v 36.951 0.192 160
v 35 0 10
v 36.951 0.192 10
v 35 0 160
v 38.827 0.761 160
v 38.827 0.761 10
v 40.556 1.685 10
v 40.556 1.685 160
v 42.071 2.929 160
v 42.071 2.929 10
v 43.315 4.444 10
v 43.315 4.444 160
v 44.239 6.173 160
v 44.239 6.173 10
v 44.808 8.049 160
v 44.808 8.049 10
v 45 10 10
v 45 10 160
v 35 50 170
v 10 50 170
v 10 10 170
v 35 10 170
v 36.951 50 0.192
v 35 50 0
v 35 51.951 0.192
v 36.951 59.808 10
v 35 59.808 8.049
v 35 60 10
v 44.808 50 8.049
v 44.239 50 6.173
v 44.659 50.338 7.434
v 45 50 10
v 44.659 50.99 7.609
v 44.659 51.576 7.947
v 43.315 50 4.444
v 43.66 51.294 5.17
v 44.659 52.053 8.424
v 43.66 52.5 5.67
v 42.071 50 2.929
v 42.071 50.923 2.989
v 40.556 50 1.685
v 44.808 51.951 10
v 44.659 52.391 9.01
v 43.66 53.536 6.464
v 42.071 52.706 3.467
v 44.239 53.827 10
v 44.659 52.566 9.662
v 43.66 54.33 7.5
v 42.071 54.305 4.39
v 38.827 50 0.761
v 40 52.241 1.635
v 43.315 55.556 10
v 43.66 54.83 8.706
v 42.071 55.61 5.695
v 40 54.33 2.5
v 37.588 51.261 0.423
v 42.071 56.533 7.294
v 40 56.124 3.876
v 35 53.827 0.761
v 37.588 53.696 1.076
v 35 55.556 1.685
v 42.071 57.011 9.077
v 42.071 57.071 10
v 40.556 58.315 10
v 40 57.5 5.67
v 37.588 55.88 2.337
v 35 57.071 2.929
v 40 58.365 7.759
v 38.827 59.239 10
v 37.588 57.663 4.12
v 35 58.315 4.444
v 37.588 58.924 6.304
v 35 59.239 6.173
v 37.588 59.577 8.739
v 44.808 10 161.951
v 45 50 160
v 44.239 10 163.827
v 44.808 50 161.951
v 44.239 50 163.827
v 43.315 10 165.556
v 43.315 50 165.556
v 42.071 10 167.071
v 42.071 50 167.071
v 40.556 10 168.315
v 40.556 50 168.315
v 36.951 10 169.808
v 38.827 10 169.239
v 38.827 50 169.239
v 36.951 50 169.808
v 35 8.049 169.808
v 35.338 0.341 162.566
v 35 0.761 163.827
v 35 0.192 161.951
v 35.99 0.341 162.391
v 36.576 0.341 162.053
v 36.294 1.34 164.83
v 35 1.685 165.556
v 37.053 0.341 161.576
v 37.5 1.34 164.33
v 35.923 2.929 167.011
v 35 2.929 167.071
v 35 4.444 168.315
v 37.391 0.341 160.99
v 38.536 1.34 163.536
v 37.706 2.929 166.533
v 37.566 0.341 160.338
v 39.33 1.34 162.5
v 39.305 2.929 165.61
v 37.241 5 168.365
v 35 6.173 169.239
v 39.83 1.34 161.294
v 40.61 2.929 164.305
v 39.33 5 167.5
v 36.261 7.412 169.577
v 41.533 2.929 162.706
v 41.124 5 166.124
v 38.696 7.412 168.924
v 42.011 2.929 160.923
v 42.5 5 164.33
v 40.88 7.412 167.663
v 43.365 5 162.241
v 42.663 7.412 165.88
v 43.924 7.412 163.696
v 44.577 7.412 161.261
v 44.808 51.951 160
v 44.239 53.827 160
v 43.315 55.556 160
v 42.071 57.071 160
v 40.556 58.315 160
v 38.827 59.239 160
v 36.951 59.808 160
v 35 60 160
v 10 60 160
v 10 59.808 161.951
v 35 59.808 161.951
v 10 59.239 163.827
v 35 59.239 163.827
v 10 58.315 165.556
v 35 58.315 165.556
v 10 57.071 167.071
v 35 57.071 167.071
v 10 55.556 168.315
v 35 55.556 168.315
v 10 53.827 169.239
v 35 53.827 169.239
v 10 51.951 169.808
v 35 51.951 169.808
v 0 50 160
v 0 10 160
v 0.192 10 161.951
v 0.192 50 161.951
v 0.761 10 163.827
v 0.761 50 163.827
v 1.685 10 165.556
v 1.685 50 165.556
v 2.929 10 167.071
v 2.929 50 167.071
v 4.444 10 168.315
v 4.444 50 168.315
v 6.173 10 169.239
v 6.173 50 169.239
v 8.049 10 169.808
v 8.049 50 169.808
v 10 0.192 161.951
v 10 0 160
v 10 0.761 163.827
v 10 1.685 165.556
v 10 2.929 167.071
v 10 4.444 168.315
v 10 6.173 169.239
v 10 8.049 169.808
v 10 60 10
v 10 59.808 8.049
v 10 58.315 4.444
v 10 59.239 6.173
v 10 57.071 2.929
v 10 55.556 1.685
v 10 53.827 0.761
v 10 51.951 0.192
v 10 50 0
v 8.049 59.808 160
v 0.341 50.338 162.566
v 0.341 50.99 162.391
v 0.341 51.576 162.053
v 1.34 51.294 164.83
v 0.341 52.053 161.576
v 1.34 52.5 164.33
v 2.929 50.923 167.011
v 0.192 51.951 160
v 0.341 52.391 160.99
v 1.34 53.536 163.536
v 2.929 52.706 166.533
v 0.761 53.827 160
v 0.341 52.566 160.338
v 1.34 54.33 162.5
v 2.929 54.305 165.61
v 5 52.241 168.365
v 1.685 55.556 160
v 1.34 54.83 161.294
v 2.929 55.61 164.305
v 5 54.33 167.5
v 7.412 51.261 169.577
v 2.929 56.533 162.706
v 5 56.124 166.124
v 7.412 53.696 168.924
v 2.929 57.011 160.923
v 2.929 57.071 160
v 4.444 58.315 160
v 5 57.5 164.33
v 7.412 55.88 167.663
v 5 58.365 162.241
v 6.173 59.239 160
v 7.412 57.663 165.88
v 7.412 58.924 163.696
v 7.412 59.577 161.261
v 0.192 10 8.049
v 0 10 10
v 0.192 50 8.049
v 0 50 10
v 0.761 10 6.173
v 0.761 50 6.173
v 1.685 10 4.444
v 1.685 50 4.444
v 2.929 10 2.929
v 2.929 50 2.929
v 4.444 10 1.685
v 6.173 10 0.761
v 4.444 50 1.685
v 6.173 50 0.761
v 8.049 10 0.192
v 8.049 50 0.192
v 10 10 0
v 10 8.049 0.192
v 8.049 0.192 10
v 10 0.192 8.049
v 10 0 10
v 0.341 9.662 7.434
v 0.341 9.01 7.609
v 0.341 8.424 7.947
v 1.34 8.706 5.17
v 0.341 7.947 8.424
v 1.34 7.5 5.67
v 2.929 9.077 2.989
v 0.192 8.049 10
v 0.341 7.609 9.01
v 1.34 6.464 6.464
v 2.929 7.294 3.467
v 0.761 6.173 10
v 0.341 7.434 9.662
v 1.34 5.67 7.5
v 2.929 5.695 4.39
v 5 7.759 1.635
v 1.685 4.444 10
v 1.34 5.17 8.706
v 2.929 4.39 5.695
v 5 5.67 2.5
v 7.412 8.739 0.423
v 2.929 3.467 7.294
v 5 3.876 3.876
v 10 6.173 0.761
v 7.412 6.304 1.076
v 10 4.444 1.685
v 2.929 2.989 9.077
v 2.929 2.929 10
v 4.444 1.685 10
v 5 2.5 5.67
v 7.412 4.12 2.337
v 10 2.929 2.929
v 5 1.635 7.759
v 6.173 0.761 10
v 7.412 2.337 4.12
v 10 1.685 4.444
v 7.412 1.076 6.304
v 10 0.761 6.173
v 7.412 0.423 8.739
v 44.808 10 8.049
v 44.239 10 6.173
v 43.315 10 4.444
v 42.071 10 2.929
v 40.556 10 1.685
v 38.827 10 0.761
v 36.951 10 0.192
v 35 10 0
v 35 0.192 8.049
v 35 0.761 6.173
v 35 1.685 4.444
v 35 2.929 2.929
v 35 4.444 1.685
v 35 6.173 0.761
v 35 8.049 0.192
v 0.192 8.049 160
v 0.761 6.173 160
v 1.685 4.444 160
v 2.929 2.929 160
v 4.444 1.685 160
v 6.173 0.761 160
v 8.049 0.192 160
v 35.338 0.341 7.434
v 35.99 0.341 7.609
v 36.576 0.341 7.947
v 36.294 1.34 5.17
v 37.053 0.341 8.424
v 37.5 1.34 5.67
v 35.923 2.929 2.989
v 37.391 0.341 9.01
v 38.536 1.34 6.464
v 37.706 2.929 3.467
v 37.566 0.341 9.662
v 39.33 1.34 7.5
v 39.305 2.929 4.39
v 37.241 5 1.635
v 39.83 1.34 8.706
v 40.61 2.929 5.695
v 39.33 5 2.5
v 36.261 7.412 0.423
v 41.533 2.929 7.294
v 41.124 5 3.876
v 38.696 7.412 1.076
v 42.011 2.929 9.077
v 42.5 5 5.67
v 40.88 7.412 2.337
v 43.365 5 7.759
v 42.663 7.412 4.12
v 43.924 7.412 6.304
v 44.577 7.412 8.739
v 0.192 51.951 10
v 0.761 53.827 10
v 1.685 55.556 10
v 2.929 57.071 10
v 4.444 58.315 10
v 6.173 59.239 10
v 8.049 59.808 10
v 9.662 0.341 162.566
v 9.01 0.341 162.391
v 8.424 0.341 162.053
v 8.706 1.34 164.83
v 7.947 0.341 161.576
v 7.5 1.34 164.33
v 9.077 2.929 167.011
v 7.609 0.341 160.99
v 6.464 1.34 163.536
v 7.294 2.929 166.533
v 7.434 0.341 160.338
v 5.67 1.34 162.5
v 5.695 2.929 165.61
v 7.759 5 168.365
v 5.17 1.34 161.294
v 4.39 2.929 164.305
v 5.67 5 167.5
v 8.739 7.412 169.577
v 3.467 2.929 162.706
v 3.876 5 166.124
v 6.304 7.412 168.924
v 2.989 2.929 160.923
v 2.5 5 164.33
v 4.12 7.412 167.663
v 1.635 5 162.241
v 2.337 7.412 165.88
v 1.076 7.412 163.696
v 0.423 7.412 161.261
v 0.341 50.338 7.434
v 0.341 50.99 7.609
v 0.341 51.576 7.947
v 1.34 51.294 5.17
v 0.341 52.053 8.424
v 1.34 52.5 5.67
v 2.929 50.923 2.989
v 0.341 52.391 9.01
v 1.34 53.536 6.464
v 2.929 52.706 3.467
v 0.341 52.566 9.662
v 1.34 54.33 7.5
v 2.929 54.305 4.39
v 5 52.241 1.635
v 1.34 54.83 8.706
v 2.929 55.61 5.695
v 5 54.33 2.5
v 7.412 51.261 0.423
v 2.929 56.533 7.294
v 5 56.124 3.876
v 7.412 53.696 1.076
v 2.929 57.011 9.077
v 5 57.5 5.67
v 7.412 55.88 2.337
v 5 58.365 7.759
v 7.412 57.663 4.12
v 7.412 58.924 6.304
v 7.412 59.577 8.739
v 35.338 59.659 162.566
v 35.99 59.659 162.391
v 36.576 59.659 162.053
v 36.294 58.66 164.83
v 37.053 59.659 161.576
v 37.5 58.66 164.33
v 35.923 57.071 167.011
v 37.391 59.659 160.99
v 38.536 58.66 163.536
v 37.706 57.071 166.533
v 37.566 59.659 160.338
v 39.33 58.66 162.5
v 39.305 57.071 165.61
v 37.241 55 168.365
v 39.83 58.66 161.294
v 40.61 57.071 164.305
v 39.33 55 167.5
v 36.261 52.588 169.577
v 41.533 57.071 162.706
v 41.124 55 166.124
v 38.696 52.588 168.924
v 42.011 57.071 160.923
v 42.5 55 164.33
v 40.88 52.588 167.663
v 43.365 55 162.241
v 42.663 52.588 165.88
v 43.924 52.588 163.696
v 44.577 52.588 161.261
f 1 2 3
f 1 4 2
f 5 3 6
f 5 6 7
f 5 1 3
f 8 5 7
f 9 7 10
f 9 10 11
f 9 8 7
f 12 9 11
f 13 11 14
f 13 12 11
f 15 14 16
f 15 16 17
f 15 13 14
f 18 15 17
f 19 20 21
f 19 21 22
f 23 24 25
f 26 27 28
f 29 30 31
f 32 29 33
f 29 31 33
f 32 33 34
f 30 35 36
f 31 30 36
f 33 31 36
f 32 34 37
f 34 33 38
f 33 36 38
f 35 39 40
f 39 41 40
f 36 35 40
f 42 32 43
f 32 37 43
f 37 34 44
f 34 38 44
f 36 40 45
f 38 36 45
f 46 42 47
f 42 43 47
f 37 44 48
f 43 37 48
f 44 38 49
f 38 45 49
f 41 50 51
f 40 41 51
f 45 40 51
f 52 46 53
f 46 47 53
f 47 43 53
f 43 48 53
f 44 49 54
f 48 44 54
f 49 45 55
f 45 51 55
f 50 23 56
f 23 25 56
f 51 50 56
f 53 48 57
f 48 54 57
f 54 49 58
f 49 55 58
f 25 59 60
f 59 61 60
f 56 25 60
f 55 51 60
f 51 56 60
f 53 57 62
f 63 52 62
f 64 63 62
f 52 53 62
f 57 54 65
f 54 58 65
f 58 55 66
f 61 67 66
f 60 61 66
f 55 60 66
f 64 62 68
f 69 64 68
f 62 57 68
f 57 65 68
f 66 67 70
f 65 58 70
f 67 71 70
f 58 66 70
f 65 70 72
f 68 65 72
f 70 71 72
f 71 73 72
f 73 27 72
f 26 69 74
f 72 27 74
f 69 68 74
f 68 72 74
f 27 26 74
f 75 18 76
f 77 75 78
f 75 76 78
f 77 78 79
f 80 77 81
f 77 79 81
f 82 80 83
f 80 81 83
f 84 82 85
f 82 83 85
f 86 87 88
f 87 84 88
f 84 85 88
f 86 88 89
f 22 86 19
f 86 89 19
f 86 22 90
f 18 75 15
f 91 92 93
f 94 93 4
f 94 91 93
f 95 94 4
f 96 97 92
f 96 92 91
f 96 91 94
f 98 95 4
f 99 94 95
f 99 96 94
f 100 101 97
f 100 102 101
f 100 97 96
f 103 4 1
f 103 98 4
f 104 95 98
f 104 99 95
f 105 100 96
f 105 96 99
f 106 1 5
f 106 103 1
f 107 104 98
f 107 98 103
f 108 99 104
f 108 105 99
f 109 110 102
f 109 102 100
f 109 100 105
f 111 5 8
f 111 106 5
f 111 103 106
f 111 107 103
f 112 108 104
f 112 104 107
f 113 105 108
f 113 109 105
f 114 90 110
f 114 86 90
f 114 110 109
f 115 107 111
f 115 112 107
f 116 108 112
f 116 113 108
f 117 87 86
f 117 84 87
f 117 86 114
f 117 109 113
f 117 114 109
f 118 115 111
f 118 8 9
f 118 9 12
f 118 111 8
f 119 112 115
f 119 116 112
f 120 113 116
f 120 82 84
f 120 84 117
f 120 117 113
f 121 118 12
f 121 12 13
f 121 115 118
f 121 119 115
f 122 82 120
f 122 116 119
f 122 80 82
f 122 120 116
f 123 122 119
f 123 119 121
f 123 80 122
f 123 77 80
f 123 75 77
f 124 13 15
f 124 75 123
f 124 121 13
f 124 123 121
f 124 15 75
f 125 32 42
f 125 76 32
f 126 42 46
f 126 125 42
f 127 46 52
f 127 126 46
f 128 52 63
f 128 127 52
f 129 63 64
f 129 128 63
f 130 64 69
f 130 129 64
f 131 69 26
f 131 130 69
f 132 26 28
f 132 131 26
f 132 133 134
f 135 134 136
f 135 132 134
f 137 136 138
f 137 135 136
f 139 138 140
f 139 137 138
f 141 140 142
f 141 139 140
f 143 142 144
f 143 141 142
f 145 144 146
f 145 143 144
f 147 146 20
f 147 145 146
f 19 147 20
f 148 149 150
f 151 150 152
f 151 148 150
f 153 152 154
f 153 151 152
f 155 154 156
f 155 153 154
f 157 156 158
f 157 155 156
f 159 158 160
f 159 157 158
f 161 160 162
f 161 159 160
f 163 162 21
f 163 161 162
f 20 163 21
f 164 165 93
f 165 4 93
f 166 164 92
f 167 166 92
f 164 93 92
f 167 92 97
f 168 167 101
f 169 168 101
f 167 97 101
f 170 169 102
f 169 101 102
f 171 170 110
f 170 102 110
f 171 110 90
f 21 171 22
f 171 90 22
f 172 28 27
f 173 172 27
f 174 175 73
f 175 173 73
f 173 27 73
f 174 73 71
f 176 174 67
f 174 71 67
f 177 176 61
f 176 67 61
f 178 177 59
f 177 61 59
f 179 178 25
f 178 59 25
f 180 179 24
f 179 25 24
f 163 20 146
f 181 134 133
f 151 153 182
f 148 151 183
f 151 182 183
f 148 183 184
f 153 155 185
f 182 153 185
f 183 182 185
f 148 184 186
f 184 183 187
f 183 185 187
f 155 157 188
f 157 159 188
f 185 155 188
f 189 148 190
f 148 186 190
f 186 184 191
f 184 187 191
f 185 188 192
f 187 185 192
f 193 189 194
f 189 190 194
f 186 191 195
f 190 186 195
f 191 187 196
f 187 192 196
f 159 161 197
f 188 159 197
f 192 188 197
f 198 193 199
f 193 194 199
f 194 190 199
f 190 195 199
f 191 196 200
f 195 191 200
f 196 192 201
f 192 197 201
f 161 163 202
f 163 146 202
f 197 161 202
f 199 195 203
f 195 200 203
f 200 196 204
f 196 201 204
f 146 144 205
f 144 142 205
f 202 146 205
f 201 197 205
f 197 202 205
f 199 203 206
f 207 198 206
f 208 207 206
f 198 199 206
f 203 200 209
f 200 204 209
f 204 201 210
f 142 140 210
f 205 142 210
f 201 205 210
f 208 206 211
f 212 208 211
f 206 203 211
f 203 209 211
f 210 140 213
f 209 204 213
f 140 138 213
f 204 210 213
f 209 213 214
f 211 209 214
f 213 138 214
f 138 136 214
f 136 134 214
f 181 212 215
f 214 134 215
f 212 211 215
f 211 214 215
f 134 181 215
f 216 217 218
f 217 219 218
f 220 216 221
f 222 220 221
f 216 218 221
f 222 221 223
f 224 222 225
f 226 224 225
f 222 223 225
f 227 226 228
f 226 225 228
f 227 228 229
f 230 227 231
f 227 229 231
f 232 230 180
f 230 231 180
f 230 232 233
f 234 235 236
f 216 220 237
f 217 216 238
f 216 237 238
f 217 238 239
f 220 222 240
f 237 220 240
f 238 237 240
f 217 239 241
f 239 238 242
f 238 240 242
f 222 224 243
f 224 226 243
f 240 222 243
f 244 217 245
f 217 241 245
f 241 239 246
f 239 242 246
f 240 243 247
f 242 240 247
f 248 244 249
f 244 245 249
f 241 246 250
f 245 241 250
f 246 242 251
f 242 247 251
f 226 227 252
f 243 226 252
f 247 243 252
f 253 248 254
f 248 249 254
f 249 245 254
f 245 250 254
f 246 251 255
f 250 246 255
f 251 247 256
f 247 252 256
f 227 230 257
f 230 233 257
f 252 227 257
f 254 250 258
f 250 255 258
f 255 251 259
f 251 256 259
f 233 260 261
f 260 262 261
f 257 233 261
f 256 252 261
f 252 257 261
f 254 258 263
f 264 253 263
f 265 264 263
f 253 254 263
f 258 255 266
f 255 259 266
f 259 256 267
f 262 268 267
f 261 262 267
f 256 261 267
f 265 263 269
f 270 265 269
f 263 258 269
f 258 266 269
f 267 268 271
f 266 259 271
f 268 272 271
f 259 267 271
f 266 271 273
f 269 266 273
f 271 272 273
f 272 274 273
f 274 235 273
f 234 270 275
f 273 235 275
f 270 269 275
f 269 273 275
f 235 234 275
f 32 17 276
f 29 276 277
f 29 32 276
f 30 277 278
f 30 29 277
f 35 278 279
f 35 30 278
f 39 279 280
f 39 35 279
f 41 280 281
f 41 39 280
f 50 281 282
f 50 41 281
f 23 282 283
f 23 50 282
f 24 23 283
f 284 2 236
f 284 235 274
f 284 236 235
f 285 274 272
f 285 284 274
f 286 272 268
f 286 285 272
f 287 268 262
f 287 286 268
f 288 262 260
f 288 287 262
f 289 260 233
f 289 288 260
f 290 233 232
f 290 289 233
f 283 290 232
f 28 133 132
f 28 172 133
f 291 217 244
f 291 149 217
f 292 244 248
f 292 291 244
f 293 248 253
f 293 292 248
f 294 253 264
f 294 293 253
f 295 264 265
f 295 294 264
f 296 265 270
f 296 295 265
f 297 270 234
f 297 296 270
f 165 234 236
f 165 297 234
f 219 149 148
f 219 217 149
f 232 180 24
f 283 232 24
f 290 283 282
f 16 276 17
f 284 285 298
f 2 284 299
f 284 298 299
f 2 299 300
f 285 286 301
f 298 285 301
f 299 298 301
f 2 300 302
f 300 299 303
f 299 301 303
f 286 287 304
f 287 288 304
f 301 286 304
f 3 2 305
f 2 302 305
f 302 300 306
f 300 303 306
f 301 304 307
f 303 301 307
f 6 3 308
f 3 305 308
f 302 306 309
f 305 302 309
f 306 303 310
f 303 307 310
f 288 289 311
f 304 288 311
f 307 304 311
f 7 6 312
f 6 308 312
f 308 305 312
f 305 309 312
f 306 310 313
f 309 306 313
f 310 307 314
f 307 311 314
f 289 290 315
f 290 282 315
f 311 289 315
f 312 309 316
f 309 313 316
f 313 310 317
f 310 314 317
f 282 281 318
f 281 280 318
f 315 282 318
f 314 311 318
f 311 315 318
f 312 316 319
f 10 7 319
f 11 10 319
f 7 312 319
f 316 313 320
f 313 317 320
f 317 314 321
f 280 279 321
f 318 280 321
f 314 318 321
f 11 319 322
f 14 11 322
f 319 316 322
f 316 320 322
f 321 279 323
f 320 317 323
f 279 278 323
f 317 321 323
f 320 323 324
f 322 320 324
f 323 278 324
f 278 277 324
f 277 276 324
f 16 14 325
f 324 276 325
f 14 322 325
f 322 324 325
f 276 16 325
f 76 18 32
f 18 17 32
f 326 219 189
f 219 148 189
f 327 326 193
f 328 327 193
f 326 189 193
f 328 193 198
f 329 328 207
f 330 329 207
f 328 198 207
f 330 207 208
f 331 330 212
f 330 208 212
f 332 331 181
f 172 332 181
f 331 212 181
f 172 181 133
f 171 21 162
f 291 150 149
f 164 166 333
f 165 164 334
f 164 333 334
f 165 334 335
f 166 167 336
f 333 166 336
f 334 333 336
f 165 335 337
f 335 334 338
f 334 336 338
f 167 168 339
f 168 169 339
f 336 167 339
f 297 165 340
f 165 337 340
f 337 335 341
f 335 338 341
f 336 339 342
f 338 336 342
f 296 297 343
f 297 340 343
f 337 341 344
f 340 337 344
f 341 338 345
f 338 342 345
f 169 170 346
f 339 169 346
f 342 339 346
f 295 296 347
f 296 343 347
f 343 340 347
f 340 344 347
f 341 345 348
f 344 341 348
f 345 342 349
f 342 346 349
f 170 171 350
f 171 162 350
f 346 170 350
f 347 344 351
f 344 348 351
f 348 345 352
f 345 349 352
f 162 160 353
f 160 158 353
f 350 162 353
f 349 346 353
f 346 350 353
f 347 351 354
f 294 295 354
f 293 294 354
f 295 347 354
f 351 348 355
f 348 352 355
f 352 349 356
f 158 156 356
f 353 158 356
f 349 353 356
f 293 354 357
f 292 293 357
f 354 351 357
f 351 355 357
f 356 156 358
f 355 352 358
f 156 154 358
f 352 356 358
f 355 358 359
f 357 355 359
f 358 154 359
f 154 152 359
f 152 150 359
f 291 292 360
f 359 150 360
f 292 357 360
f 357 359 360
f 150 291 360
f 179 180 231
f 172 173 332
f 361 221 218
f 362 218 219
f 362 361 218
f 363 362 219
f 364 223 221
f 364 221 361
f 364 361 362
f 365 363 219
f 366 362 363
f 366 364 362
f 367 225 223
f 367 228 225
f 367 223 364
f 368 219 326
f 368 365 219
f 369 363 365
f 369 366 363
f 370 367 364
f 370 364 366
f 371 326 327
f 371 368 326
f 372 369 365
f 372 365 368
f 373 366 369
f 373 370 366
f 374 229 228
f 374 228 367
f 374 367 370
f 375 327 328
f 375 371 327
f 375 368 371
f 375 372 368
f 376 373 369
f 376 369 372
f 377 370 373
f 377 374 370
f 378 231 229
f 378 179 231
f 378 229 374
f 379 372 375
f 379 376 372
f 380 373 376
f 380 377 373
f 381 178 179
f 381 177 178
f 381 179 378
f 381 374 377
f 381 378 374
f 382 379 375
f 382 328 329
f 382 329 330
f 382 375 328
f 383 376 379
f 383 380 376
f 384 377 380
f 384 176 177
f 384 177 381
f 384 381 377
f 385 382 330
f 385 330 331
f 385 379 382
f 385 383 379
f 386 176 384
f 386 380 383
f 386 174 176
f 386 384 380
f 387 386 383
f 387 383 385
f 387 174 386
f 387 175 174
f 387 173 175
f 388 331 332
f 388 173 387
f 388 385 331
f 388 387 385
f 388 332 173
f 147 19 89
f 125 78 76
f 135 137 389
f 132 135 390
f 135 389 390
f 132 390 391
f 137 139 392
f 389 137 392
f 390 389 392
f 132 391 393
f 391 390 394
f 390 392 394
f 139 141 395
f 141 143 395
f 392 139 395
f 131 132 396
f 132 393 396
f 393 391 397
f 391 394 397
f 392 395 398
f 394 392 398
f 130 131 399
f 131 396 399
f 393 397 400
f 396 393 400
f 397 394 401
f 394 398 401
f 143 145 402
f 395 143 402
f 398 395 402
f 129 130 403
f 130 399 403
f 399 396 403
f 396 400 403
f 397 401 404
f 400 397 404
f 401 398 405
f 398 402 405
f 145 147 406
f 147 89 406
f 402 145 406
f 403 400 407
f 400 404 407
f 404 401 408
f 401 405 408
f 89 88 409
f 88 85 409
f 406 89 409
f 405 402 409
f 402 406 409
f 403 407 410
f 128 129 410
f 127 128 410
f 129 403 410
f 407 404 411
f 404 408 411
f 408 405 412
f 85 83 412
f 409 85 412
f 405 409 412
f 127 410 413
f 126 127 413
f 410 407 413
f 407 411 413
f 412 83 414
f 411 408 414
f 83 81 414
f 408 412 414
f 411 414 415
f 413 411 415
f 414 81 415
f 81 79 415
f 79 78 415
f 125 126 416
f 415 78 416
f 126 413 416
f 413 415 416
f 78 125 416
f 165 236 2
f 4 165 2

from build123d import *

# Parameters (mm, degrees)
ESQUISSE1_W        = 45
ESQUISSE1_H        = 60
BOSS_EXTRU_1_DEPTH = 170
CONG_1_R           = 10


with BuildPart() as part:
    # Esquisse1 → Boss.-Extru.1 (new body)
    with BuildSketch(Plane.XY):
        with Locations((22.5, 30)):
            Rectangle(ESQUISSE1_W, ESQUISSE1_H)
    extrude(amount=BOSS_EXTRU_1_DEPTH)

    # Congé1
    cong_1_edges = [part.edges().sort_by_distance(p)[0] for p in [
        (45, 30, 170),
        (22.5, 60, 170),
        (0, 30, 170),
        (22.5, 60, 0),
        (45, 30, 0),
        (22.5, 0, 0),
        (0, 30, 0),
        (22.5, 0, 170),
        (0, 60, 85),
        (45, 60, 85),
        (45, 0, 85),
        (0, 0, 85),
    ]]
    fillet(cong_1_edges, radius=CONG_1_R)


solid = part.part
